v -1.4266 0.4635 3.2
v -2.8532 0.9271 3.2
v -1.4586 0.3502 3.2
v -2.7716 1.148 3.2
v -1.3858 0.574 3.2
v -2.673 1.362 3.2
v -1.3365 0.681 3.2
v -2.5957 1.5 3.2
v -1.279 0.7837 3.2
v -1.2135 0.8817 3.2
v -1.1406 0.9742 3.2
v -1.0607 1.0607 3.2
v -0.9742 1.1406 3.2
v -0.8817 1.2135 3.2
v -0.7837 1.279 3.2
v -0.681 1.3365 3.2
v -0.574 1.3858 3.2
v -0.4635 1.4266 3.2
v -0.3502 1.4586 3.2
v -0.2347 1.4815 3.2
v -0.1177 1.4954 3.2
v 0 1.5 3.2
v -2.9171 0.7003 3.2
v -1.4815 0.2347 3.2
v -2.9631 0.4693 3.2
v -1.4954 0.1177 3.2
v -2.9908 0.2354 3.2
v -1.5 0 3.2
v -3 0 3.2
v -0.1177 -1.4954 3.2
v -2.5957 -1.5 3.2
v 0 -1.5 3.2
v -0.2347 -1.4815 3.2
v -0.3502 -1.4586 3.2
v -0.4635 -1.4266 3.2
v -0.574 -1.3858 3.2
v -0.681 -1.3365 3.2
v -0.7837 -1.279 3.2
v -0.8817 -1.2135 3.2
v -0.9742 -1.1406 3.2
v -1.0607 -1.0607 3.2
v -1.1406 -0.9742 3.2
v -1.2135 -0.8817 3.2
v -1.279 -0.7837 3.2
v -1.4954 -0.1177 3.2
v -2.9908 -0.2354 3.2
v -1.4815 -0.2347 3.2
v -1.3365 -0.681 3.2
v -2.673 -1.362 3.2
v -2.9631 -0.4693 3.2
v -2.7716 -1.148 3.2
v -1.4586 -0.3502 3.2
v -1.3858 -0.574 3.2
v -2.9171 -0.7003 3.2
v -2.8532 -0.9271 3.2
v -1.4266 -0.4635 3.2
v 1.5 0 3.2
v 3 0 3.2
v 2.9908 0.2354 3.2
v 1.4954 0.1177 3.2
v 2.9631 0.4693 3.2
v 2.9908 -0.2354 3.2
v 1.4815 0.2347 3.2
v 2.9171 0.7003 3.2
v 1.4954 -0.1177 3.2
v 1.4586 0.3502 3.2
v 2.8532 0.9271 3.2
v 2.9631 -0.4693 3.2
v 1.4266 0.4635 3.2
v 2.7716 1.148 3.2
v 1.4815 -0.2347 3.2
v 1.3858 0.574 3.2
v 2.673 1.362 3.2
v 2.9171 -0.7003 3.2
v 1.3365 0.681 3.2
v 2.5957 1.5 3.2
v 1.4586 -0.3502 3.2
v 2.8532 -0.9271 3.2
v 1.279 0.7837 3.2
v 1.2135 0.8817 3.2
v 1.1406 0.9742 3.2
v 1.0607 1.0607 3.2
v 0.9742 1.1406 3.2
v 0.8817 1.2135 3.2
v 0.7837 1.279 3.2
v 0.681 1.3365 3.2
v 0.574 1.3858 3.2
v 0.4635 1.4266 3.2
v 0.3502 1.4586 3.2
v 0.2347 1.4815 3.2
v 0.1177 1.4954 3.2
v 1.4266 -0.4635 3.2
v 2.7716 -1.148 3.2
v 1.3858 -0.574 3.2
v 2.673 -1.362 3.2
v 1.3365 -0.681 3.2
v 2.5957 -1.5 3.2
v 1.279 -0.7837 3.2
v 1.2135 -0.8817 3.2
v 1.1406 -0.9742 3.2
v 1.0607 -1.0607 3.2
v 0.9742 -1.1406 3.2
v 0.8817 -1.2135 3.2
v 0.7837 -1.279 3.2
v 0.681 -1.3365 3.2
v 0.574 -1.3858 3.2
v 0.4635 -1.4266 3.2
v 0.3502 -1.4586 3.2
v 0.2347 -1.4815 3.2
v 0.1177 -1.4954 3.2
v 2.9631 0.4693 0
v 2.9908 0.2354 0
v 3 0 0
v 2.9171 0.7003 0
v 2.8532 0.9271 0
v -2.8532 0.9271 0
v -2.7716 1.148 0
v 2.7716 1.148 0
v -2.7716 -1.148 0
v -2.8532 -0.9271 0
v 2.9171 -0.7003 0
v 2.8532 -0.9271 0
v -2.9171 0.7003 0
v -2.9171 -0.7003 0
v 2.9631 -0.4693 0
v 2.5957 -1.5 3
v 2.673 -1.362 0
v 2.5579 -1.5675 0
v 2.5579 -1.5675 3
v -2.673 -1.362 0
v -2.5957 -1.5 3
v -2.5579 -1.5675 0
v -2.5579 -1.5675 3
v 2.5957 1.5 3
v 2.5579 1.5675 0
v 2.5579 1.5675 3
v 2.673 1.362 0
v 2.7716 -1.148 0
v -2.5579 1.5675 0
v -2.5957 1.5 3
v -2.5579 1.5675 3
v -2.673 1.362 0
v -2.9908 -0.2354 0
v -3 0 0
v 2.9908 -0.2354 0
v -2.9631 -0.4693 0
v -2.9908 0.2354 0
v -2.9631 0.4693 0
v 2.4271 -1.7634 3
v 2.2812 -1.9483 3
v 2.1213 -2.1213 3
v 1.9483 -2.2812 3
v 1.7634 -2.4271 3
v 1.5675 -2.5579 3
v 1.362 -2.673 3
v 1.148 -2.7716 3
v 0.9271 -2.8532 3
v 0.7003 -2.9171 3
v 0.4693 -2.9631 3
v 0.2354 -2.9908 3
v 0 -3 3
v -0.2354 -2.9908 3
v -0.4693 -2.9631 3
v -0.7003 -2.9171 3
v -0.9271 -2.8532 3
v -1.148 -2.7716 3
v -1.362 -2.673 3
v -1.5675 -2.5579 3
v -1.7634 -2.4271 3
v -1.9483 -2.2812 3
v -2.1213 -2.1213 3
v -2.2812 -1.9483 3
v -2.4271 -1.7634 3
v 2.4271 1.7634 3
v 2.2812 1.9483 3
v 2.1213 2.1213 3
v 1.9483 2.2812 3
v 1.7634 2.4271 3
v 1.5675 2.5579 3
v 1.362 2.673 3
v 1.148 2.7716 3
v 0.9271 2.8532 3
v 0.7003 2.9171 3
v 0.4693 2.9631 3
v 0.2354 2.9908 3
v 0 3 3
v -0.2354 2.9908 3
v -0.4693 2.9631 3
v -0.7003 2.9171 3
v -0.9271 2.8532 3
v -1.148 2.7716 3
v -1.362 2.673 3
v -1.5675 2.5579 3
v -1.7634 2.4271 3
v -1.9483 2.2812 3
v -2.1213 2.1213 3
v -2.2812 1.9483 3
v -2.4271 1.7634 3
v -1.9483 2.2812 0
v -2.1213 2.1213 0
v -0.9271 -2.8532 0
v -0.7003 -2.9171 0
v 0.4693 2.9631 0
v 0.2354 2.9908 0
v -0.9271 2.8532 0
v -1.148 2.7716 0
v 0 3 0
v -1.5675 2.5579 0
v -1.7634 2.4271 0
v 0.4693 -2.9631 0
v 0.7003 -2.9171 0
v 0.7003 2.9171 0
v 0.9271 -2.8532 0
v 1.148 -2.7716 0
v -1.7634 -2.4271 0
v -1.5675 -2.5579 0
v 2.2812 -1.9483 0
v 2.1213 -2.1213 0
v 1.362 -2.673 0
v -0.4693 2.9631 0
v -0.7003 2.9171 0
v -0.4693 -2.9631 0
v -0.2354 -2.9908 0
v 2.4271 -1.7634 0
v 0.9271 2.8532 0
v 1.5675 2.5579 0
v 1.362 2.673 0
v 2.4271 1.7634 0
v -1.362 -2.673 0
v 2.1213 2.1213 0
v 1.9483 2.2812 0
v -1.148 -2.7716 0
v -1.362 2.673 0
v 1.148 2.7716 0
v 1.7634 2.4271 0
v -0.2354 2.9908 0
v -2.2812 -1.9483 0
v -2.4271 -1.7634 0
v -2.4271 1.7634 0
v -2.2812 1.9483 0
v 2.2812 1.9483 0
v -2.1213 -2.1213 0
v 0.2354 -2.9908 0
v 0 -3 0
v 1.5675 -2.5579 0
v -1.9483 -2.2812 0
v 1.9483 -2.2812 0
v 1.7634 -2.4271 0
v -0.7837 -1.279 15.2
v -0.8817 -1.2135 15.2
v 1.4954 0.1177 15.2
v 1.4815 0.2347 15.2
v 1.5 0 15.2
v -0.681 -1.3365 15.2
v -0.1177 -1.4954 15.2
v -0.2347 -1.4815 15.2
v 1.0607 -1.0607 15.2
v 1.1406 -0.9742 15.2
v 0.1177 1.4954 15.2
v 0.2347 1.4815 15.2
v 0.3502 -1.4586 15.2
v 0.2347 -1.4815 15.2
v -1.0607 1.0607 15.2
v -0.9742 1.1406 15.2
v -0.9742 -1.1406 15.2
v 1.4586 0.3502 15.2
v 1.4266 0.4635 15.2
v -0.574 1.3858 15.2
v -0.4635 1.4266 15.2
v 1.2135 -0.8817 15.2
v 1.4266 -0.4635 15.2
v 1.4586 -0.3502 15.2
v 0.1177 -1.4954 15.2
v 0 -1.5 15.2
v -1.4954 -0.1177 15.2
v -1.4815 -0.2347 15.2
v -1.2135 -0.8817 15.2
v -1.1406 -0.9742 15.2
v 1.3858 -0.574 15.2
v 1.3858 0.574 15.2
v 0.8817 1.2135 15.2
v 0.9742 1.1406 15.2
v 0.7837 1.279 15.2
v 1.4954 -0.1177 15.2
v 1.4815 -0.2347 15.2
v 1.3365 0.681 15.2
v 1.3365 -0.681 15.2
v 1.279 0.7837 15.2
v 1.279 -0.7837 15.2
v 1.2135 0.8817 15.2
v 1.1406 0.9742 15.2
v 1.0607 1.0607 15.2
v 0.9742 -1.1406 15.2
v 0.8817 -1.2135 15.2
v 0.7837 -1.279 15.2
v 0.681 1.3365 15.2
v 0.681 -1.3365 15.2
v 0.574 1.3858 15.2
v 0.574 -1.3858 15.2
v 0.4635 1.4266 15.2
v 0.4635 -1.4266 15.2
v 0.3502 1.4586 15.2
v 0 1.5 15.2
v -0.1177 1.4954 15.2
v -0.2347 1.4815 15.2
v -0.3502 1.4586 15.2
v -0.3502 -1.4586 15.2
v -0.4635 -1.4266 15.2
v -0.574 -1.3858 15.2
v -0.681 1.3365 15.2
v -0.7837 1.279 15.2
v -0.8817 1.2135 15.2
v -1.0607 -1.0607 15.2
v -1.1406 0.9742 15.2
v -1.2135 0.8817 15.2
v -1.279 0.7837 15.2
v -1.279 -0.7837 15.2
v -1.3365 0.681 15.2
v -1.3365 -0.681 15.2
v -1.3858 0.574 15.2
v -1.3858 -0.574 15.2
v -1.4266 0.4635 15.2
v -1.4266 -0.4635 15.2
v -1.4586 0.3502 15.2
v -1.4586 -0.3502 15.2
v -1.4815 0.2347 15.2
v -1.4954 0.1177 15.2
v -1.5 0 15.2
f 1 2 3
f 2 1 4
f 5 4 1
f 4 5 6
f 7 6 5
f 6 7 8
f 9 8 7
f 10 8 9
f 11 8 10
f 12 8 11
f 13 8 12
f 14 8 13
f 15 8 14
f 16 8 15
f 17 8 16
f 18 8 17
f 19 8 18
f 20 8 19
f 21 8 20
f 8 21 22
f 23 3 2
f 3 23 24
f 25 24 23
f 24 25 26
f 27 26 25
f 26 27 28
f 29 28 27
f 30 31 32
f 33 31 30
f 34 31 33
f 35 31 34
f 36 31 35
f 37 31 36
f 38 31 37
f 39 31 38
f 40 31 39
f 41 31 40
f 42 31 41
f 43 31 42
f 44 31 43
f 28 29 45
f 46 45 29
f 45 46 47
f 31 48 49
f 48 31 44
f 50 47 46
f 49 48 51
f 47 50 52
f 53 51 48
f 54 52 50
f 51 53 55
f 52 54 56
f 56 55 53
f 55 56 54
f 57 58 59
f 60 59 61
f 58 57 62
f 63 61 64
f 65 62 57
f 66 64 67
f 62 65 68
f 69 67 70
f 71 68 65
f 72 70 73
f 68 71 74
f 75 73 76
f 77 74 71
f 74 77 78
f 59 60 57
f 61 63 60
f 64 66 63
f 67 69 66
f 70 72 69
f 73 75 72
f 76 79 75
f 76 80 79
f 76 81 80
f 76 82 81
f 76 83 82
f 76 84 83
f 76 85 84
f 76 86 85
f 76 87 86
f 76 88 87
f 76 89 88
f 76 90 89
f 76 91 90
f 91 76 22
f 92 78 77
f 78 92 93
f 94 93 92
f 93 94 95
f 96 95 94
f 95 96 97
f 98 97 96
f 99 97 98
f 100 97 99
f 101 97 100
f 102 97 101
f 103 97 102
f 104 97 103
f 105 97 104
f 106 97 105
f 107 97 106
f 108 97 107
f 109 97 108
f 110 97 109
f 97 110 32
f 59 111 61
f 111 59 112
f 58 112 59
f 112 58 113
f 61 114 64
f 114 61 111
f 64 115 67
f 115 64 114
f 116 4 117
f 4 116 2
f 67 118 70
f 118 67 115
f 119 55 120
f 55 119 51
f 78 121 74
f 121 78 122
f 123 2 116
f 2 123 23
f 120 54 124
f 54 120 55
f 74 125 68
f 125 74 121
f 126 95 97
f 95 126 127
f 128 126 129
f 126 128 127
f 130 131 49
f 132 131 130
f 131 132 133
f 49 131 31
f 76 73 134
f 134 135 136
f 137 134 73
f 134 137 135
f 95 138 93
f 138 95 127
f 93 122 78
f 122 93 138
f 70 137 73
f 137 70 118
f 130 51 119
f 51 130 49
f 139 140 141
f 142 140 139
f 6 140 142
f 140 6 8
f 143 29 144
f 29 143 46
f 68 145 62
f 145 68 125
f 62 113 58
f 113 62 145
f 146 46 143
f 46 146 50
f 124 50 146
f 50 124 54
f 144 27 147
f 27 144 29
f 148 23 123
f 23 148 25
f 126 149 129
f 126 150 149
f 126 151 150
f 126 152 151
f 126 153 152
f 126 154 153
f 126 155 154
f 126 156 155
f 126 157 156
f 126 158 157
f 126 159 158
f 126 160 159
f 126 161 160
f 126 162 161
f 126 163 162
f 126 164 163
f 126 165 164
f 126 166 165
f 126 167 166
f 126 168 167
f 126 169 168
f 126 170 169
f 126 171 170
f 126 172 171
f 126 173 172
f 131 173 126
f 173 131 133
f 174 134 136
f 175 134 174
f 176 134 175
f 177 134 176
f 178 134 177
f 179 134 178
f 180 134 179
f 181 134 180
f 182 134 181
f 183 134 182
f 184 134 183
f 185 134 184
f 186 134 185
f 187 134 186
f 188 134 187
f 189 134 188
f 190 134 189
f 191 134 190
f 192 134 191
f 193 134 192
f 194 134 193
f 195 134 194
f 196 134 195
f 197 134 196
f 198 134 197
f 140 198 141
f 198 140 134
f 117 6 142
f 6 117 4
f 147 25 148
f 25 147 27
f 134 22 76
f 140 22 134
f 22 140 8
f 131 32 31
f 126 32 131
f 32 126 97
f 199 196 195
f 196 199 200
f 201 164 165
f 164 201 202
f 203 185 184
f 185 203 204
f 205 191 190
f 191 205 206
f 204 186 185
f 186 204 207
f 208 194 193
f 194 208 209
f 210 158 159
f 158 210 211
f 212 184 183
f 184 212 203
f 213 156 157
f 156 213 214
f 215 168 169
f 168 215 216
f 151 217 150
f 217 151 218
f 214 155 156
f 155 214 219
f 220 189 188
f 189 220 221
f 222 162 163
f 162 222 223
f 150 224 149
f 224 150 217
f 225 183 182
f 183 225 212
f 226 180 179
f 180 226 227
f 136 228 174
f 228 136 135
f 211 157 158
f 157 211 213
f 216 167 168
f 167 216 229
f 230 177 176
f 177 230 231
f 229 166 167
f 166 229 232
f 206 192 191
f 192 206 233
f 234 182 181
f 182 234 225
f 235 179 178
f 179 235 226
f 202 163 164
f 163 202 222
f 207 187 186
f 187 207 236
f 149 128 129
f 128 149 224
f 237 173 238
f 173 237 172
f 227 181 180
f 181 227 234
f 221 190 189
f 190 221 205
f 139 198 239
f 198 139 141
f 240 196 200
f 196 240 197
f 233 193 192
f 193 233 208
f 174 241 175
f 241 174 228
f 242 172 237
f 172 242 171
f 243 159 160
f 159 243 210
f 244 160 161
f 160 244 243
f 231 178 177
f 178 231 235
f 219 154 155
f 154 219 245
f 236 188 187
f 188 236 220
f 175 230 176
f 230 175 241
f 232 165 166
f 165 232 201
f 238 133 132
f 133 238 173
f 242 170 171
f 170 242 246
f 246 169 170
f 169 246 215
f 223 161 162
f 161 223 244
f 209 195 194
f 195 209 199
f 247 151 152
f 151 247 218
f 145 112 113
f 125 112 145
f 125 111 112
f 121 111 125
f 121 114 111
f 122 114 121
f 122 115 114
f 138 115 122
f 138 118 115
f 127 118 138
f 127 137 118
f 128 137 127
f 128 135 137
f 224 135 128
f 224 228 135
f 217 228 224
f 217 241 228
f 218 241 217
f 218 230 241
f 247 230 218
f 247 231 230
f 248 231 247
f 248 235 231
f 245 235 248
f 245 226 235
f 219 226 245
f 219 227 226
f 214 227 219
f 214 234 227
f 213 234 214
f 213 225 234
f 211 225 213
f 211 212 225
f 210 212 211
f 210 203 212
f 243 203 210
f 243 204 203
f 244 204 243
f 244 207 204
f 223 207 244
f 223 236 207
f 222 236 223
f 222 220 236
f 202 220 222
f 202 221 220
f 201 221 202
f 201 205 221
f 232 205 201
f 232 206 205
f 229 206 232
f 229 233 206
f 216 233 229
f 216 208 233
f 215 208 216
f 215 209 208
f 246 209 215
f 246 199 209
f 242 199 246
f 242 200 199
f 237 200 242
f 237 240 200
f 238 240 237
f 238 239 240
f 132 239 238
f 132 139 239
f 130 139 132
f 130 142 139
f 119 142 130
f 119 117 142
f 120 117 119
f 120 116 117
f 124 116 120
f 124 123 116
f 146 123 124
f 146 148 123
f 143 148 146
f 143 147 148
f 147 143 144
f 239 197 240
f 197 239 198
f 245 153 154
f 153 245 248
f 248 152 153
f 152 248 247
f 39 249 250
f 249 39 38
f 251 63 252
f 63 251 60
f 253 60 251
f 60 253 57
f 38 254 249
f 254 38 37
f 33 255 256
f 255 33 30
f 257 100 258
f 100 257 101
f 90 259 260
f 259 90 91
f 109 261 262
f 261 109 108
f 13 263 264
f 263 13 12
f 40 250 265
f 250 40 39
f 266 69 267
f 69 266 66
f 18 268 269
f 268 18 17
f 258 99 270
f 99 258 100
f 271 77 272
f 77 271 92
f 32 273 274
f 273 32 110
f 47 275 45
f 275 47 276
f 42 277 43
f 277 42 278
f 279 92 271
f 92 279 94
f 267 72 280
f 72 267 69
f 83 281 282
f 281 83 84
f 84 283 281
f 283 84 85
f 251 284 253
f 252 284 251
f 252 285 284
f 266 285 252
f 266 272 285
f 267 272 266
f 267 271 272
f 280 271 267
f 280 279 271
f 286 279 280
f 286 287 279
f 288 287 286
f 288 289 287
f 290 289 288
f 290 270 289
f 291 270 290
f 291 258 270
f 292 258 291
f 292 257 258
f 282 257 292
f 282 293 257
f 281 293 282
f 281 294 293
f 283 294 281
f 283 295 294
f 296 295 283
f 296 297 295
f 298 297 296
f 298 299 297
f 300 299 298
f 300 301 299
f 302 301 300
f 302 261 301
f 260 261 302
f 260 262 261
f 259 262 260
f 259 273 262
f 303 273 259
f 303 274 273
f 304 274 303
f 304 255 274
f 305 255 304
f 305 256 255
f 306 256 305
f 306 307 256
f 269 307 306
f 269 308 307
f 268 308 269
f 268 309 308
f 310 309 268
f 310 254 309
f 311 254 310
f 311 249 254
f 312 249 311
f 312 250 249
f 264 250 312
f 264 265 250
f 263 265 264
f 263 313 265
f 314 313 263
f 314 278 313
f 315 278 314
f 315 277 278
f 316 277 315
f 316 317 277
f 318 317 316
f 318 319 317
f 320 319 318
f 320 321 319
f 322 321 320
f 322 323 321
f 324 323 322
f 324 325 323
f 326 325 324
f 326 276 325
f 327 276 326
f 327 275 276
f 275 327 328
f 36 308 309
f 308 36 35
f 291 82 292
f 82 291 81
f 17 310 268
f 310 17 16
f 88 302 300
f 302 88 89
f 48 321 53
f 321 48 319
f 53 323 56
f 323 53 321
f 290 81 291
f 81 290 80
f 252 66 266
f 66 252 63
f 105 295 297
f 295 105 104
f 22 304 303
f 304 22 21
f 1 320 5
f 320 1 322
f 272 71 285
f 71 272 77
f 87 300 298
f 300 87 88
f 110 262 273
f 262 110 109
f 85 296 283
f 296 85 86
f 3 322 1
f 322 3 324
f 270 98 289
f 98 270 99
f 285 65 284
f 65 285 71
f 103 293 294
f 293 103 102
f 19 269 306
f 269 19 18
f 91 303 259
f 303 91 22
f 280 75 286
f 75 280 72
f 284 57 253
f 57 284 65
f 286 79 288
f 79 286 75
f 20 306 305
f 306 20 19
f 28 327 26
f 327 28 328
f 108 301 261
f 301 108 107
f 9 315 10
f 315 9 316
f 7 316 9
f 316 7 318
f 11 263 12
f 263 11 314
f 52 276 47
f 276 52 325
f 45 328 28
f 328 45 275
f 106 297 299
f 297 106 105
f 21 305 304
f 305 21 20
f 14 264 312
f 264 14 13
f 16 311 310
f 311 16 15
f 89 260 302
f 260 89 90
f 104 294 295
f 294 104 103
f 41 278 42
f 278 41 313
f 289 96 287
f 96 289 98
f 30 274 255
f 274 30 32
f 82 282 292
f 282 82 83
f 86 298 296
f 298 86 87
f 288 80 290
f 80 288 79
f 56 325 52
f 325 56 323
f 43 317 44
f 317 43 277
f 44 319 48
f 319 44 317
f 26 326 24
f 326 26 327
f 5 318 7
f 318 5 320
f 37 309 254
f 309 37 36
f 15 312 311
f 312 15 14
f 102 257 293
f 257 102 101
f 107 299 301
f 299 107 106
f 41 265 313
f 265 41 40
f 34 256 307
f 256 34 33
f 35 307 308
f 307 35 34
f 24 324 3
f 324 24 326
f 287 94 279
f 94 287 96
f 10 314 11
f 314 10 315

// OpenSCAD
/*
makerspace workshop 2023-09-02
author: andimoto
*/
$fn=80;

/* [box dimensions] */
innerBoxX = 100;
innerBoxY = 100;
innerBoxZ = 60;

wallThickness = 5;
bottomThickness = 5;

edgeRadius = 5;

/* [lid] */
lidThickness = 5;
lidClearance = 0.4;
lidFixZ = 1;

/* [screw dimensions] */
screwDia = 3;
screwDiaTolerance = 0.2;
screwLen = 12;
screwHeadR = 6;


/* [other parameters] */
extra = 0.01;

module box()
{
  difference()
  {
    translate([edgeRadius,edgeRadius,0])
    minkowski()
    {
      cube([innerBoxX+wallThickness*2-edgeRadius*2,
        innerBoxY+wallThickness*2-edgeRadius*2,
        innerBoxZ+bottomThickness-extra*2]);
      cylinder(r=edgeRadius, h=extra);
    }

    translate([edgeRadius+wallThickness,edgeRadius+wallThickness,bottomThickness+extra])
    minkowski()
    {
      cube([innerBoxX-edgeRadius*2,
        innerBoxY-edgeRadius*2,
        innerBoxZ-extra*2]);
      cylinder(r=edgeRadius, h=extra);
    }
  }
}

/* box(); */


module lid()
{
  difference()
  {
    union()
    {
      translate([edgeRadius,edgeRadius,0])
      minkowski()
      {
        cube([innerBoxX+wallThickness*2-edgeRadius*2,
          innerBoxY+wallThickness*2-edgeRadius*2,
          lidThickness-extra*2]);
        cylinder(r=edgeRadius, h=extra);
      }
      translate([edgeRadius+wallThickness+lidClearance,
        edgeRadius+wallThickness+lidClearance,0])
      minkowski()
      {
        cube([innerBoxX-lidClearance*2-edgeRadius*2,
          innerBoxY-lidClearance*2-edgeRadius*2,
          lidFixZ+lidThickness-extra*2]);
        cylinder(r=edgeRadius, h=extra);
      }
    } /* union */

    screws();

  }
}
/* lid(); */

module screws()
{

}



screw(screwD=3, screwHeadD = 6, screwHeadThickness =3);
module screw(screwD = 3, screwHeadD = 6, screwHeadThickness = 3)
{
  /* head */
  cylinder(r=screwHeadD/2, h=screwHeadThickness);
  /* screw */
  translate([0,0,screwHeadThickness+0.2])
  cylinder(r = screwD/2, h=screwLen);

  translate([0,0,screwHeadThickness])
  intersection()
  {
    cylinder(r=screwD,h=0.2);
    translate([0,0,0.1])
      cube([screwHeadD,screwD,0.2],center=true);
  }
}
